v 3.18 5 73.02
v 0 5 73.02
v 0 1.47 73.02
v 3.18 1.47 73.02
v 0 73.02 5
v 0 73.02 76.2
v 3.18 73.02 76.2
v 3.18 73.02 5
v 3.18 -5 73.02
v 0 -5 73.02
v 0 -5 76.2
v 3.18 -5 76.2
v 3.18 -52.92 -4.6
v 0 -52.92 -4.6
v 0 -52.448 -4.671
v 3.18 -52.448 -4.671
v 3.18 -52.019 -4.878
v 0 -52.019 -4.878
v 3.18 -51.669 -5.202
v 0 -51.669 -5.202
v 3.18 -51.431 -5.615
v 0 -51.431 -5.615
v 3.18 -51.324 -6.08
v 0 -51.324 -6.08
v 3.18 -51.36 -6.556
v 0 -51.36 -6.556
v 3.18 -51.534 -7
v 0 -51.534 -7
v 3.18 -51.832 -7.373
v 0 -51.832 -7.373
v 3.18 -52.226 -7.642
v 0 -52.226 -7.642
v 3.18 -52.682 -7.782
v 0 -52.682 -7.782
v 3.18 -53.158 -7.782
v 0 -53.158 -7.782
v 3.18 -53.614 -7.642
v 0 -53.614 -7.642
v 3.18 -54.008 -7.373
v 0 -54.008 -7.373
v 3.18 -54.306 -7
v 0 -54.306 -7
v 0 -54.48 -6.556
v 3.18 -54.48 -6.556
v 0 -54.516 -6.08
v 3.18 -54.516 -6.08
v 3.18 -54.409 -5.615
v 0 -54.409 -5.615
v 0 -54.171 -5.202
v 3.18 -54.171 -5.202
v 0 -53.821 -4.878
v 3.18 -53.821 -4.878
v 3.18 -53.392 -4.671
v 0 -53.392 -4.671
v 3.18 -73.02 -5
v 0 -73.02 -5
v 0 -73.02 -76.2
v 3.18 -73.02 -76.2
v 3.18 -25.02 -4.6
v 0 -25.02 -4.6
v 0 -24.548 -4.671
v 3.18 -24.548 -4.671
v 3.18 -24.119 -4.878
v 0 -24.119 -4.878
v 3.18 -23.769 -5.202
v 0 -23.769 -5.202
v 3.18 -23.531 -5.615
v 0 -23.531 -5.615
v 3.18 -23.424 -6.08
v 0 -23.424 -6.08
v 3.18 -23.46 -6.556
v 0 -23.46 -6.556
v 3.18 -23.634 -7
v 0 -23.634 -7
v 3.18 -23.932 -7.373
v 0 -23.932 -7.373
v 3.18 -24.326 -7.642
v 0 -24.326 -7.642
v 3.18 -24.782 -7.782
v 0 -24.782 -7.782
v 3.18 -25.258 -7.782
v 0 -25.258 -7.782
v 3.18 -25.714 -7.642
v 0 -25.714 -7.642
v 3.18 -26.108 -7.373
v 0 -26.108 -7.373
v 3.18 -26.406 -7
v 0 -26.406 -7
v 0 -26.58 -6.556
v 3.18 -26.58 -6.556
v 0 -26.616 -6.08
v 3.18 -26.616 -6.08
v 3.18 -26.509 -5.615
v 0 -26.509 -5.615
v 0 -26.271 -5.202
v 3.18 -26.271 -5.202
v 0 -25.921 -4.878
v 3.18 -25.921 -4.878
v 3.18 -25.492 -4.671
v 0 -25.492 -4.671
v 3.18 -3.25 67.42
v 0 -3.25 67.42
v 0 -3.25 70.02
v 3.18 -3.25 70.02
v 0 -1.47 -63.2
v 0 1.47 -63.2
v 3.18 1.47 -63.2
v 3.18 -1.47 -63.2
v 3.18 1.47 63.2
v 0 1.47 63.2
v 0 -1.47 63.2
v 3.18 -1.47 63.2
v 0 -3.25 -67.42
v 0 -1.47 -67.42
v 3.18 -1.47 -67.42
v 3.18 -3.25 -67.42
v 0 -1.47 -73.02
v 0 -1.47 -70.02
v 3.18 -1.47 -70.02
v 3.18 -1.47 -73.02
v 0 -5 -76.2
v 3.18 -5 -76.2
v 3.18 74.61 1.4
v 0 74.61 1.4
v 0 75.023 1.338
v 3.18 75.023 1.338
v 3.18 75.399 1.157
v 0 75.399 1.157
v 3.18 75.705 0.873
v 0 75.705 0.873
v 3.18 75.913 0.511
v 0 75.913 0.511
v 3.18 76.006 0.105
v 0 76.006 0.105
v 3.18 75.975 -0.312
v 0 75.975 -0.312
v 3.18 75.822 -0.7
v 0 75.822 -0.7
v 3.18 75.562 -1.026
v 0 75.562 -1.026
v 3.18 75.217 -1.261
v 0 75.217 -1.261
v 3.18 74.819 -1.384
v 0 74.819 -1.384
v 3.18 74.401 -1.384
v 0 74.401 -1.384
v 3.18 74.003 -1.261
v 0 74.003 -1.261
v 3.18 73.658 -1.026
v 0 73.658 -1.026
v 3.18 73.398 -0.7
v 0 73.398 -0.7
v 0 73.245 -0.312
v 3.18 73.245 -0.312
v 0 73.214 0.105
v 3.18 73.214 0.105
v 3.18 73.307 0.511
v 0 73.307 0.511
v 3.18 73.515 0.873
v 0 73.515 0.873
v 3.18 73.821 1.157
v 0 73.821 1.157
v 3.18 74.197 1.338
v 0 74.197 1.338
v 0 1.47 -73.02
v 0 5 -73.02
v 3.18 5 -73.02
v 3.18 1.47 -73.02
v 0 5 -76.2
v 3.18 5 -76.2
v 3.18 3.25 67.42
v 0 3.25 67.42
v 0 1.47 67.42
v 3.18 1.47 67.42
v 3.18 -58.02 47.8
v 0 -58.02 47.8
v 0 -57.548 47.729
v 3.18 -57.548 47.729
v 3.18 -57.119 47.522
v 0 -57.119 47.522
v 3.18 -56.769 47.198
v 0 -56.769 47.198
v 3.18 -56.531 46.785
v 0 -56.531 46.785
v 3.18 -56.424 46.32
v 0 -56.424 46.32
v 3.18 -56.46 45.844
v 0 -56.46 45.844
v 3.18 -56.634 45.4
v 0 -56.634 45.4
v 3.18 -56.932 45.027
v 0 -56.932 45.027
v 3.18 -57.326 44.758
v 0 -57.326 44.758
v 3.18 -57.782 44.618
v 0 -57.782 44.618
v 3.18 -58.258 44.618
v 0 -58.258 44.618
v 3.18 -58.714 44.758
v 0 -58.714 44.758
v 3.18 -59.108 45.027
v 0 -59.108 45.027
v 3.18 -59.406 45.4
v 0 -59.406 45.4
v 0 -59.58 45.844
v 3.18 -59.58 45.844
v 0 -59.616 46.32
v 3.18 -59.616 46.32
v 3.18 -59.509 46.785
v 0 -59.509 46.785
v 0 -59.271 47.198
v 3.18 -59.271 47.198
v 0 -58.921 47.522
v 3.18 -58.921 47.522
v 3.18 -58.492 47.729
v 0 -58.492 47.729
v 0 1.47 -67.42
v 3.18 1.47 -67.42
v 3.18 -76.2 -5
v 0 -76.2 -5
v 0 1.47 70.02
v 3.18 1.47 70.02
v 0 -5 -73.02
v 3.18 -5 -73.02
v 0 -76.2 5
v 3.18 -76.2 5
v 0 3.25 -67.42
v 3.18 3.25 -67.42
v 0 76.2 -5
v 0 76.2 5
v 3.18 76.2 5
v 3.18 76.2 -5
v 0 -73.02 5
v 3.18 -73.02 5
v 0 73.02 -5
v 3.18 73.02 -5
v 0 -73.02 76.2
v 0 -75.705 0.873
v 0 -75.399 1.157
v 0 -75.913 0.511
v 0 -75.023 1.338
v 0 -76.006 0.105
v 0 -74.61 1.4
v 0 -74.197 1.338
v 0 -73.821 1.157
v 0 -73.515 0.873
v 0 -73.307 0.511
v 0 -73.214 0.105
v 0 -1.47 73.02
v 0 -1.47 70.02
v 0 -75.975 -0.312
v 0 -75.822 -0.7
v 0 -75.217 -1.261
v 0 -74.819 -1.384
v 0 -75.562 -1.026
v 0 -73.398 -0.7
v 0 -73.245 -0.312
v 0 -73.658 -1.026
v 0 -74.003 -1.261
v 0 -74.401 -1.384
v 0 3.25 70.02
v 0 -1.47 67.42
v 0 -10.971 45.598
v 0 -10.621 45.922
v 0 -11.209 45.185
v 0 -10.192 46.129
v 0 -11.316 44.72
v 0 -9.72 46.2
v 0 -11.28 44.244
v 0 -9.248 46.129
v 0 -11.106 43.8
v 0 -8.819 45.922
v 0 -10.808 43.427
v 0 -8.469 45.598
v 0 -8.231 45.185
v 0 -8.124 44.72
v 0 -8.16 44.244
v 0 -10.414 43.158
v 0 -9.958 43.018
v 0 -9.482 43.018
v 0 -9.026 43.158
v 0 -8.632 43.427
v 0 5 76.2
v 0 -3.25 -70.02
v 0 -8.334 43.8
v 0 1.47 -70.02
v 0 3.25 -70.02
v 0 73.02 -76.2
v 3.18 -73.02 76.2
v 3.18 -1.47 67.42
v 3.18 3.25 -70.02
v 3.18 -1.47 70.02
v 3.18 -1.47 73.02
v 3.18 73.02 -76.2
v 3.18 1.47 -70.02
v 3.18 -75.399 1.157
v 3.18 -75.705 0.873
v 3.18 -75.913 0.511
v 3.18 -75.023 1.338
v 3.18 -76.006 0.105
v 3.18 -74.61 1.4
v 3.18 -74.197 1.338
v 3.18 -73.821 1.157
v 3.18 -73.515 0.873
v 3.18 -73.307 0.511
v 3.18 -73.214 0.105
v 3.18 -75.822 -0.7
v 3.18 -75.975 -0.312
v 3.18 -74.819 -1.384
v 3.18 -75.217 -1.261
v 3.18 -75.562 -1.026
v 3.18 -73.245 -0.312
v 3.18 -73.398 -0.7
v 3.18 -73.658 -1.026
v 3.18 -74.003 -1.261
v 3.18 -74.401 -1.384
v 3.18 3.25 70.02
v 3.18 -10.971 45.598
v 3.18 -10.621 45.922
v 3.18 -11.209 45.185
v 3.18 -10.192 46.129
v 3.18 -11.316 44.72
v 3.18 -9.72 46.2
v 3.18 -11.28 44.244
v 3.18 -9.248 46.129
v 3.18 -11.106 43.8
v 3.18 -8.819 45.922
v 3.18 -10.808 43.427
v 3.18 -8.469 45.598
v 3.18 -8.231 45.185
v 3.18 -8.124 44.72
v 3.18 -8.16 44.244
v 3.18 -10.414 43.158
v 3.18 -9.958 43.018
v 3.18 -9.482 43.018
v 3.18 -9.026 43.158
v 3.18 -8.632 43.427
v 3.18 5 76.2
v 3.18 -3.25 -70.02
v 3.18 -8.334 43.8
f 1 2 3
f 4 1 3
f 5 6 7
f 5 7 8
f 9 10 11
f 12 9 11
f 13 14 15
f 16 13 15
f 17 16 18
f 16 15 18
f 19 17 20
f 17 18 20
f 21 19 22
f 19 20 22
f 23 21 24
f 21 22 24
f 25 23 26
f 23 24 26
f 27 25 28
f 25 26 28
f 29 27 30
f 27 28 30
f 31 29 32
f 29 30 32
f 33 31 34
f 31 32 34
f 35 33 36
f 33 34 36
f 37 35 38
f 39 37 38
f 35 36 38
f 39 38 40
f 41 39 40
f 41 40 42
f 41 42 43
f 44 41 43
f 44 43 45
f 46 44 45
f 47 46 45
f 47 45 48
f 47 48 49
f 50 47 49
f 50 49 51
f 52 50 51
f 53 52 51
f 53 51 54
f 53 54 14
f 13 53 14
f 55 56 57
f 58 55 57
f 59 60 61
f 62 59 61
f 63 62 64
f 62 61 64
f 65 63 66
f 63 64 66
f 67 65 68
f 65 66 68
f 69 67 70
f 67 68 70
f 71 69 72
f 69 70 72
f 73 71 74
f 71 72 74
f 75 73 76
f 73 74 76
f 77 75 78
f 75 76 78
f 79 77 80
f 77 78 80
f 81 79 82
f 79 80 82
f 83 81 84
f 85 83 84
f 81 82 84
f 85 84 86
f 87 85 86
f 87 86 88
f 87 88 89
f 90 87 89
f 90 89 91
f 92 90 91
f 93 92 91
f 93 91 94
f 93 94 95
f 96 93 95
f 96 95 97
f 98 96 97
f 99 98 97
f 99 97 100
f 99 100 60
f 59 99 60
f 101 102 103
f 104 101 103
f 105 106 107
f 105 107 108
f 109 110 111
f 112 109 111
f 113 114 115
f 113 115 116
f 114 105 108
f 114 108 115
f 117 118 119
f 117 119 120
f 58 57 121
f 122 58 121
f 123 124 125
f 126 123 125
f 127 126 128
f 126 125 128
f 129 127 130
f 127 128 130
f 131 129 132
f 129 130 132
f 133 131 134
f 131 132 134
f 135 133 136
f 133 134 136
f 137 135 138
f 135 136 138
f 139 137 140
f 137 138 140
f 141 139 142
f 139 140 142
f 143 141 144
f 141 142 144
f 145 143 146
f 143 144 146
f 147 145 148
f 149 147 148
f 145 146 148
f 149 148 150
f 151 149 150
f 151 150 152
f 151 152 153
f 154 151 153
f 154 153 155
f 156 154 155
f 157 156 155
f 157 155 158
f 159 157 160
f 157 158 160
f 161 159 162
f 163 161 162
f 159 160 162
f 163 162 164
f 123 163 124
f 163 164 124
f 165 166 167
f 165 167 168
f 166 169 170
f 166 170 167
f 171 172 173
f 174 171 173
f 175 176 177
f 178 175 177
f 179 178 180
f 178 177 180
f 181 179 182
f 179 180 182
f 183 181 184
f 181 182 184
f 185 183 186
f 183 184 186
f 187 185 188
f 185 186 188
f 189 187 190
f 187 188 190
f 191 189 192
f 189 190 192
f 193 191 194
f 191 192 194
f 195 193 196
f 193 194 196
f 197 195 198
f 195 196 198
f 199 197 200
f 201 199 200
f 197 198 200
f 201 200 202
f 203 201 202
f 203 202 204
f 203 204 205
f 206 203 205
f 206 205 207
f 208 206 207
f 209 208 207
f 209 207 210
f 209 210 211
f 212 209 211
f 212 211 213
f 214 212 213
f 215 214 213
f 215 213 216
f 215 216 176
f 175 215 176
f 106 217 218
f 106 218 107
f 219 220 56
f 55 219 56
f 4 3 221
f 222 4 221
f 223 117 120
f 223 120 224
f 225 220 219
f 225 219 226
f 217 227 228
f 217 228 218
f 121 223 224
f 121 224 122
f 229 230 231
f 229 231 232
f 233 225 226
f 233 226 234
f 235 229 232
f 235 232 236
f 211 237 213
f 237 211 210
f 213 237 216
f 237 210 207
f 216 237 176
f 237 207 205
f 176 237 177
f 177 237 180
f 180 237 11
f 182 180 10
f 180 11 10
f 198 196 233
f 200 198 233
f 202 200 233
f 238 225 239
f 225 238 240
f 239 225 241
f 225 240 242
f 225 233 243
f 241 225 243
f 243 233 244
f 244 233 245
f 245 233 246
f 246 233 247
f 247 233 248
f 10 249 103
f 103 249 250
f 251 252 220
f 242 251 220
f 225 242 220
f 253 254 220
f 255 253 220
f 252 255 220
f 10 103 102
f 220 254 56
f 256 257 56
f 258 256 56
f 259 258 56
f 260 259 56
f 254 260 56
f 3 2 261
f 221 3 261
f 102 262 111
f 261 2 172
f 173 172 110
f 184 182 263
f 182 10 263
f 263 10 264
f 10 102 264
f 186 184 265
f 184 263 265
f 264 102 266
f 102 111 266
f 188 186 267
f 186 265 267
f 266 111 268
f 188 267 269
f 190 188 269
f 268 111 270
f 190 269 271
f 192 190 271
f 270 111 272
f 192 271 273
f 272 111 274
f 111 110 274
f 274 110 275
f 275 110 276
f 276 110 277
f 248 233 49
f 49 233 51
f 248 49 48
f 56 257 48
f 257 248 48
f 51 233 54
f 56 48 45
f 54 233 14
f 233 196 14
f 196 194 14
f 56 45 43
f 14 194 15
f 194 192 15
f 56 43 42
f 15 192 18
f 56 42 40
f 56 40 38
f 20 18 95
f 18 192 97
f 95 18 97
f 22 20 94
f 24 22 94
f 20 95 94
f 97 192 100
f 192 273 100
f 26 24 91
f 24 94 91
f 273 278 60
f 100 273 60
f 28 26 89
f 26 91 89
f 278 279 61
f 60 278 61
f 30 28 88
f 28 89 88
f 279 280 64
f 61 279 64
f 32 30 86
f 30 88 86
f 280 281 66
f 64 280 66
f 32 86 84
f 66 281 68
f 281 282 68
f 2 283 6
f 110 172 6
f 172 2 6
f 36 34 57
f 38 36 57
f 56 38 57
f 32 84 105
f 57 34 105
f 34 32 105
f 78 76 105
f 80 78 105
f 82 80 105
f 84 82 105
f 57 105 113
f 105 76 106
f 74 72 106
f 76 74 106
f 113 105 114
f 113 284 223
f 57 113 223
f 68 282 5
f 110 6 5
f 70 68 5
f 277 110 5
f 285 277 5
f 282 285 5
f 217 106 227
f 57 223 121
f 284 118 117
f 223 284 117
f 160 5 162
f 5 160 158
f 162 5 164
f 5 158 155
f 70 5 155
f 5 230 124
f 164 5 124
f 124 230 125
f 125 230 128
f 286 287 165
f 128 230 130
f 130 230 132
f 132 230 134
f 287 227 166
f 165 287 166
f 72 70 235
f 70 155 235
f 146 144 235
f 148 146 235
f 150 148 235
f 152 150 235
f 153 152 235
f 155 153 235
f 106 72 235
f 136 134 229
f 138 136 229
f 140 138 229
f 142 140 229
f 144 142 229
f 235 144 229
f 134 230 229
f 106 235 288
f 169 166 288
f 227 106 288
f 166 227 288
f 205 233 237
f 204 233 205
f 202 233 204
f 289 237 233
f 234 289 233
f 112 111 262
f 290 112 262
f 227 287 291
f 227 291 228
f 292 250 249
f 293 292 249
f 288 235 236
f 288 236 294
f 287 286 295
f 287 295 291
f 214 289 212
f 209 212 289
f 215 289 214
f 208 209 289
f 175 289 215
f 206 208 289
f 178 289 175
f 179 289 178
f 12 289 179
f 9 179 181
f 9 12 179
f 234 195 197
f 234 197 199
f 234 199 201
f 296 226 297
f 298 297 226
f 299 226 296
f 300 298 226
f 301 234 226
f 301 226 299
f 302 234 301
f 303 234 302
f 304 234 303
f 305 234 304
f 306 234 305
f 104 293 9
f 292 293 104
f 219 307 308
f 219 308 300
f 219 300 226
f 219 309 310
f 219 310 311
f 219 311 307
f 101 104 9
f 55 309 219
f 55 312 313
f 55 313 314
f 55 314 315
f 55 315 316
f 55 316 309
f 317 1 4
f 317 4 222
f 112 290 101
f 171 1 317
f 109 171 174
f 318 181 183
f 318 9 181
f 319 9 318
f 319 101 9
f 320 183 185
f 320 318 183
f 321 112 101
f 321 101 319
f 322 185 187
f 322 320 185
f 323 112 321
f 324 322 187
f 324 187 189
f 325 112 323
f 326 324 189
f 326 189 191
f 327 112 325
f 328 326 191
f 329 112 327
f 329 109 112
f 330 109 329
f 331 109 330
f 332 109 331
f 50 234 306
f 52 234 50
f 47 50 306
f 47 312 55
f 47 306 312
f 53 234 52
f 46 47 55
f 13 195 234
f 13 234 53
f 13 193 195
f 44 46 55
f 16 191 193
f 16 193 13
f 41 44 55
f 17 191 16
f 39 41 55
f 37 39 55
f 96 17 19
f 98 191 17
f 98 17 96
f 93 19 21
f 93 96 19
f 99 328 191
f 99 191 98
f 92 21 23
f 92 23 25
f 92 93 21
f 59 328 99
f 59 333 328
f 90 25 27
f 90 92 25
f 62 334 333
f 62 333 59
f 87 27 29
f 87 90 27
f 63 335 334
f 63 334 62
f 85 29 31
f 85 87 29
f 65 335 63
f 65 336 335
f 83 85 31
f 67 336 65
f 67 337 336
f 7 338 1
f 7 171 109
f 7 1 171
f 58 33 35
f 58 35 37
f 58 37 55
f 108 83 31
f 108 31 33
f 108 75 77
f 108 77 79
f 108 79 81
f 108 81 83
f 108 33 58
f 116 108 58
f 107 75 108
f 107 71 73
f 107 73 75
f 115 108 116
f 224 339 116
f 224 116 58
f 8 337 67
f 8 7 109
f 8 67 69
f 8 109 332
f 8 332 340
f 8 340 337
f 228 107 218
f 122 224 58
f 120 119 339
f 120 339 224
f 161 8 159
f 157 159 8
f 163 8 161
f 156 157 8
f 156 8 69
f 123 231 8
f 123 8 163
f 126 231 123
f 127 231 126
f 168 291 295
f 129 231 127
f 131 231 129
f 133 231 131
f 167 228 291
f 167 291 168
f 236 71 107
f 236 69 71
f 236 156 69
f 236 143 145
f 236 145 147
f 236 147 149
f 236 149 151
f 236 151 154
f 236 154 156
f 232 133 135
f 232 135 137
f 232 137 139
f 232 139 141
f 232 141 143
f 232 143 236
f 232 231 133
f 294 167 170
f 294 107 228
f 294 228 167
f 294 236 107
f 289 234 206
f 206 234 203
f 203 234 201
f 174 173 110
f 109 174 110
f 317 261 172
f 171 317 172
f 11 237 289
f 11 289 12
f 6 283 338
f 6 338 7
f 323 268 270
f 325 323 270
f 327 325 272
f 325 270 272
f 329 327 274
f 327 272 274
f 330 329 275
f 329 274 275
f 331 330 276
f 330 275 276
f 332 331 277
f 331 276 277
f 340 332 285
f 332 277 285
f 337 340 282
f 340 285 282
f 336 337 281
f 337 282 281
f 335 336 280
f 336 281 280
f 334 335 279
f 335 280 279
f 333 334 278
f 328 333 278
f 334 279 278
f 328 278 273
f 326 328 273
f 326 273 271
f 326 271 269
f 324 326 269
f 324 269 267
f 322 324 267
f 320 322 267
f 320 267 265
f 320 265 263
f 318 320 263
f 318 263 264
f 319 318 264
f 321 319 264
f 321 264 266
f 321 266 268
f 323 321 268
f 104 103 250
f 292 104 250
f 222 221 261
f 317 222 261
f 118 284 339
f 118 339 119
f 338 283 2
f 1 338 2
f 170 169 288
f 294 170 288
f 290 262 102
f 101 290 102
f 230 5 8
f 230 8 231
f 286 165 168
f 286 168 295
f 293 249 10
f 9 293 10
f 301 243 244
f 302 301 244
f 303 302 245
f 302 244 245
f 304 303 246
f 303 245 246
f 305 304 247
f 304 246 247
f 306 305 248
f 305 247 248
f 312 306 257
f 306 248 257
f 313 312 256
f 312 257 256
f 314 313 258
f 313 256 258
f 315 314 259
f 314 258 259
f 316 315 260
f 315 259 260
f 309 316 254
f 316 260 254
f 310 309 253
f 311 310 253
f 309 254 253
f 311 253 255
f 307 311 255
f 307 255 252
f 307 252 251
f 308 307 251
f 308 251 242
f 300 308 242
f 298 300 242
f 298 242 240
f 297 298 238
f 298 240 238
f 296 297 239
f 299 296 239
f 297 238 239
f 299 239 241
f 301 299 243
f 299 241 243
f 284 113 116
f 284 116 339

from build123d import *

# Parameters (mm, degrees)
SKETCH1_W           = 152.4
SKETCH1_H           = 146.04
BOSS_EXTRUDE1_DEPTH = 3.18
SKETCH3_R           = 1.4
SKETCH3_W           = 10
SKETCH3_H           = 3.18
BOSS_EXTRUDE5_DEPTH = 3.18
CUT_EXTRUDE2_DEPTH  = 4.18
CUT_EXTRUDE3_DEPTH  = 4.18
SKETCH6_R           = 1.6
CUT_EXTRUDE6_DEPTH  = 4.18


with BuildPart() as part:
    # Sketch1 → Boss-Extrude1 (new body)
    with BuildSketch(Plane(origin=(0, 0, 0), x_dir=(0, 0, -1), z_dir=(1, 0, 0))):
        Rectangle(SKETCH1_W, SKETCH1_H)
    extrude(amount=BOSS_EXTRUDE1_DEPTH)

    # Sketch3 → Boss-Extrude5 (add)
    with BuildSketch(Plane.ZY):
        Polygon((0, 73.02), (5, 73.02), (5, 76.2), (-5, 76.2), (-5, 73.02), align=None)
        with Locations((0, 74.61)):
            Circle(SKETCH3_R, mode=Mode.SUBTRACT)
        with Locations((0, -74.61)):
            Rectangle(SKETCH3_W, SKETCH3_H)
        with Locations((0, -74.61)):
            Circle(SKETCH3_R, mode=Mode.SUBTRACT)
    extrude(amount=-BOSS_EXTRUDE5_DEPTH)

    # Sketch4 → Cut-Extrude2 (cut, through all)
    with BuildSketch(Plane(origin=(0, 0, 0), x_dir=(0, 0, -1), z_dir=(1, 0, 0))):
        Polygon((-76.2, -5), (-76.2, 5), (-73.02, 5), (-73.02, 1.47), (-70.02, 1.47), (-70.02, 3.25), (-67.42, 3.25), (-67.42, 1.47), (-63.2, 1.47), (-63.2, -1.47), (-67.42, -1.47), (-67.42, -3.25), (-70.02, -3.25), (-70.02, -1.47), (-73.02, -1.47), (-73.02, -5), align=None)
    extrude(amount=CUT_EXTRUDE2_DEPTH, mode=Mode.SUBTRACT)

    # Sketch5 → Cut-Extrude3 (cut, through all)
    with BuildSketch(Plane.ZY):
        Polygon((-70.02, -1.47), (-73.02, -1.47), (-73.02, -5), (-76.2, -5), (-76.2, 5), (-73.02, 5), (-73.02, 1.47), (-70.02, 1.47), (-70.02, 3.25), (-67.42, 3.25), (-67.42, 1.47), (-63.2, 1.47), (-63.2, -1.47), (-67.42, -1.47), (-67.42, -3.25), (-70.02, -3.25), align=None)
    extrude(amount=-CUT_EXTRUDE3_DEPTH, mode=Mode.SUBTRACT)

    # Sketch6 → Cut-Extrude6 (cut, through all)
    with BuildSketch(Plane.ZY):
        with Locations((46.2, -58.02)):
            Circle(SKETCH6_R)
        with Locations((44.6, -9.72)):
            Circle(SKETCH6_R)
        with Locations((-6.2, -52.92)):
            Circle(SKETCH6_R)
        with Locations((-6.2, -25.02)):
            Circle(SKETCH6_R)
    extrude(amount=-CUT_EXTRUDE6_DEPTH, mode=Mode.SUBTRACT)


solid = part.part
